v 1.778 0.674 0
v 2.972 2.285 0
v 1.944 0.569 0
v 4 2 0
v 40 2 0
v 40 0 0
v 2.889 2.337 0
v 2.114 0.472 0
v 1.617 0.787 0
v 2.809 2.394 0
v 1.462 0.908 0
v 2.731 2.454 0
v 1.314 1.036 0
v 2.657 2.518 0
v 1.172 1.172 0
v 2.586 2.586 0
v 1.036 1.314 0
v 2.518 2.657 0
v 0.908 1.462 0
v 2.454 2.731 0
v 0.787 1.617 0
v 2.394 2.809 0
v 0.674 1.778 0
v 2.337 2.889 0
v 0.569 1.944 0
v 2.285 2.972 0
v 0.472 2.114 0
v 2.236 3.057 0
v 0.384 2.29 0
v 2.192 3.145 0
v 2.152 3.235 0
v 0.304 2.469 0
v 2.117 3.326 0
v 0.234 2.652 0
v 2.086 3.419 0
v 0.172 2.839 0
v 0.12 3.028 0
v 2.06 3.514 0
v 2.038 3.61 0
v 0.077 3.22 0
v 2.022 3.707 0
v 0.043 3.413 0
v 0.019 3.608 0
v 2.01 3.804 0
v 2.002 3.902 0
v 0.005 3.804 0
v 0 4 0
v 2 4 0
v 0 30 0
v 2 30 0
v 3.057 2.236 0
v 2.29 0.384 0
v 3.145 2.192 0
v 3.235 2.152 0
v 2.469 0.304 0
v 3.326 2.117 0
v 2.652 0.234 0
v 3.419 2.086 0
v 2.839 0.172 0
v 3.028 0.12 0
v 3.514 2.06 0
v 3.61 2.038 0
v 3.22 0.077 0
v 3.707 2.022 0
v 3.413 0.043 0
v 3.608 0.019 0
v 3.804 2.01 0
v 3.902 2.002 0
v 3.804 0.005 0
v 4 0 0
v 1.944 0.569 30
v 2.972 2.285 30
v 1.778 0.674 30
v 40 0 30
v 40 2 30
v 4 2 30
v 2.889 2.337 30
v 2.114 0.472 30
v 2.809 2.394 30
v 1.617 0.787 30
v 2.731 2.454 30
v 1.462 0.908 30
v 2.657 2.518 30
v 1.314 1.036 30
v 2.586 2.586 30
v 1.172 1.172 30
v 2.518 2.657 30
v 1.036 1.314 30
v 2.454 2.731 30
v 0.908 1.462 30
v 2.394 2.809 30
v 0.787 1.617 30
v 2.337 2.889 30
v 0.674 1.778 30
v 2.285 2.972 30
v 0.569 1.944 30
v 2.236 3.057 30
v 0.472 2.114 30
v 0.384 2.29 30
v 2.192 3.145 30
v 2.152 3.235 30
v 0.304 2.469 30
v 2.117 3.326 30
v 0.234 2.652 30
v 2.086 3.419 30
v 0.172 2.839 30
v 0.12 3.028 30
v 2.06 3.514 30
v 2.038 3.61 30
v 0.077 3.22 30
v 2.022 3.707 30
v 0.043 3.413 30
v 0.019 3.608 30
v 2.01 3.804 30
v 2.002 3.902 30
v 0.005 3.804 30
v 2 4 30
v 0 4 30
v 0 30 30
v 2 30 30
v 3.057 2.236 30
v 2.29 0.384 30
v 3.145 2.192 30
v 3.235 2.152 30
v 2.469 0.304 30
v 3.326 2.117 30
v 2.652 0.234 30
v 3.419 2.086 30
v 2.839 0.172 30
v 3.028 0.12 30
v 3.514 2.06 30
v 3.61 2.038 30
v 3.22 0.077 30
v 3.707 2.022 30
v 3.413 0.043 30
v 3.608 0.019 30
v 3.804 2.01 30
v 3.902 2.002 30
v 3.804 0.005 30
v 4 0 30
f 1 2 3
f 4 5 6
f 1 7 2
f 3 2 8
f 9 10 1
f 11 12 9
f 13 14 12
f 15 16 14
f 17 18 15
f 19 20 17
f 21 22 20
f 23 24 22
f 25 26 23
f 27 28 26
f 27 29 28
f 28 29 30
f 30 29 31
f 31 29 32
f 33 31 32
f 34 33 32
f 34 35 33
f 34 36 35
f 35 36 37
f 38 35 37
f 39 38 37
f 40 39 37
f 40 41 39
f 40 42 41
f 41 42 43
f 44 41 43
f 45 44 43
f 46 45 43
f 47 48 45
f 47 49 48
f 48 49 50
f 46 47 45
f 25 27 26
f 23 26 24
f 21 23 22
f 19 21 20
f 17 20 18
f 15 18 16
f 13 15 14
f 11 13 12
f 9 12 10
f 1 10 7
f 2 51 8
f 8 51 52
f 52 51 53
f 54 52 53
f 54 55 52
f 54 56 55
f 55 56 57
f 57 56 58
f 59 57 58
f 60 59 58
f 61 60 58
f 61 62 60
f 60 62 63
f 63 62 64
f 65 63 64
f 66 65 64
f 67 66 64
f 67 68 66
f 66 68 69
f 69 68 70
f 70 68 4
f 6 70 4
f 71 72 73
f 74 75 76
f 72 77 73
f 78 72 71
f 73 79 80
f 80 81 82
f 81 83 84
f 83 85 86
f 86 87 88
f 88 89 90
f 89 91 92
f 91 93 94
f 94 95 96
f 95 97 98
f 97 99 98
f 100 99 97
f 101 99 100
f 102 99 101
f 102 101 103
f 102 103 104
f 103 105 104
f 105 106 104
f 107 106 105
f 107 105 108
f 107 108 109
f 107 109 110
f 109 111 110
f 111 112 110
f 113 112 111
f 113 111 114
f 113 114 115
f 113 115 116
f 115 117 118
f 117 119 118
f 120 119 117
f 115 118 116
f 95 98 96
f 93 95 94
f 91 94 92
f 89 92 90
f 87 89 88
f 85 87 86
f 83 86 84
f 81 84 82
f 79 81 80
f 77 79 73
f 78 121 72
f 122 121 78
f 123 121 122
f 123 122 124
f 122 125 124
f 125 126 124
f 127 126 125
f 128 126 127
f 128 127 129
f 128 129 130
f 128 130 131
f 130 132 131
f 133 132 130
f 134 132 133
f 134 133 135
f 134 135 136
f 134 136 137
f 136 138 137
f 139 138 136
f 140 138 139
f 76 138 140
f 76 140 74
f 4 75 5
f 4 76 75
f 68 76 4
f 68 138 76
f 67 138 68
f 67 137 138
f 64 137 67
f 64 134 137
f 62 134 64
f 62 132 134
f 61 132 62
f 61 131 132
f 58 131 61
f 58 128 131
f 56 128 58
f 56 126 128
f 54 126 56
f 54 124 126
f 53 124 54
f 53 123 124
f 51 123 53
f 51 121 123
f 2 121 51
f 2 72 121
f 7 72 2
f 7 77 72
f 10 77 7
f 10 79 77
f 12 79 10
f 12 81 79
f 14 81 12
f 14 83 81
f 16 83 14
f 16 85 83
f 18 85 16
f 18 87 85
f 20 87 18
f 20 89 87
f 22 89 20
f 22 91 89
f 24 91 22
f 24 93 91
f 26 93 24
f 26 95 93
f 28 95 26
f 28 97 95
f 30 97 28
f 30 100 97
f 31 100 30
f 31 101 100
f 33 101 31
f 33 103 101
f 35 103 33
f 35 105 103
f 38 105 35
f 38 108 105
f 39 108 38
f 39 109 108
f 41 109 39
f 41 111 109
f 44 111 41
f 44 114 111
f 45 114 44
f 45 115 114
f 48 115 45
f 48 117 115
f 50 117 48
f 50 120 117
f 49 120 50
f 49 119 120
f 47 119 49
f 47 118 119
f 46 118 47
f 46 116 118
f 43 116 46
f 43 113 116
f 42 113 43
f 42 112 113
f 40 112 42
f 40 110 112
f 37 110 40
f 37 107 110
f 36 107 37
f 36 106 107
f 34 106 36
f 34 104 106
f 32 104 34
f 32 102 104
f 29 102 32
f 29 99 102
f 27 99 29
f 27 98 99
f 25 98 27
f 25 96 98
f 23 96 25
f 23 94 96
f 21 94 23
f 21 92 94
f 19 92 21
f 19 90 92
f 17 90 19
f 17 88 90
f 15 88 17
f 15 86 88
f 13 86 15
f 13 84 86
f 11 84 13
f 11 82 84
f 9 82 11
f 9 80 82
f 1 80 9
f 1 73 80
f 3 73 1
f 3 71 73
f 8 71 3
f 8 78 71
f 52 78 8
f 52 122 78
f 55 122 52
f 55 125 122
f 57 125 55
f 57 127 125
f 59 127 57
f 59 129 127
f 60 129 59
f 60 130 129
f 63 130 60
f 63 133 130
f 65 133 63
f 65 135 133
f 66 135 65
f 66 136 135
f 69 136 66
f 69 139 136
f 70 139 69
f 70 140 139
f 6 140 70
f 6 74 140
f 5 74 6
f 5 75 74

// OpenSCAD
// Sheet-metal L-bracket — single 90° bend, constant gauge
// Outside: Flange A = 40 mm, Flange B = 30 mm, Width = 30 mm
// Thickness t = 2.0 mm | Inside radius r = 2.0 mm | K-factor = 0.45

t = 2.0;    // material thickness (mm)
r = 2.0;    // inside bend radius (mm)
A = 40.0;   // Flange A outside dimension (mm)
B = 30.0;   // Flange B outside dimension (mm)
W = 30.0;   // bracket width (mm)
k = 0.45;   // neutral-axis k-factor

$fn = 64;

// ── Bend-allowance (k-factor method) ─────────────────────────
// Arc-center sits (r+t) from the projected outside corner.
// Neutral axis is at radius rn = r + k·t from the inside surface.
// For 90°: BA = (π/2)·rn  |  OSSB = tan(45°)·(r+t) = r+t
c      = r + t;              // 4.0 mm  — arc-center offset
rn     = r + k * t;          // 2.9 mm  — neutral-axis radius
BA     = (PI / 2) * rn;      // ≈ 4.5553 mm — 90° bend allowance
OSSB   = c;                  // 4.0 mm  — outside set-back (tan45°=1)
leg_A  = A - OSSB;           // 36.0 mm — flat leg for Flange A
leg_B  = B - OSSB;           // 26.0 mm — flat leg for Flange B
flat_L = leg_A + BA + leg_B; // ≈ 66.555 mm — total developed flat length

echo(str("MAKERBENCH-SHEETMETAL: {",
         "\"thickness_mm\": ",  t,      ", ",
         "\"bend_radius_mm\": ", r,      ", ",
         "\"flat_length_mm\": ", flat_L, "}"));

// ── 2D cross-section in XY plane ─────────────────────────────
// Origin = outside corner (projected intersection of outer faces).
// +X direction = Flange A extends to x = A = 40
// +Y direction = Flange B extends to y = B = 30
// Bend arc center at (c, c) = (4, 4)
//
// Polygon traversal (clockwise, valid for OpenSCAD polygon):
//   (A,0) ─straight─ (c,0) ─outer arc─ (0,c)
//          ─straight─ (0,B) ─end face─  (t,B)
//          ─straight─ (t,c) ─inner arc─ (c,t)
//          ─straight─ (A,t) ─end face─  close to (A,0)

N = 32;   // arc facets per quarter-circle

function arc2d(cx, cy, rad, a0, a1, n) =
    [for (i = [0:n])
        let(a = a0 + (a1 - a0) * i / n)
        [cx + rad * cos(a), cy + rad * sin(a)]];

// Convex outer corner: angles 270°→180°  ⟹  (4,0)→(0,4)
outer_arc = arc2d(c, c, c, 270, 180, N);

// Concave inner corner: angles 180°→270°  ⟹  (2,4)→(4,2)
inner_arc = arc2d(c, c, r, 180, 270, N);

pts = concat(
    [[A, 0]],    // Flange A free end, outer face
    outer_arc,   // convex outside corner  (c,0)→(0,c)
    [[0, B]],    // Flange B free end, outer face
    [[t, B]],    // Flange B free end, inner face
    inner_arc,   // concave inside corner  (t,c)→(c,t)
    [[A, t]]     // Flange A free end, inner face
);

// ── 3D solid ──────────────────────────────────────────────────
// Extrude cross-section W mm along Z (bracket width axis).
linear_extrude(height = W)
    polygon(pts);
